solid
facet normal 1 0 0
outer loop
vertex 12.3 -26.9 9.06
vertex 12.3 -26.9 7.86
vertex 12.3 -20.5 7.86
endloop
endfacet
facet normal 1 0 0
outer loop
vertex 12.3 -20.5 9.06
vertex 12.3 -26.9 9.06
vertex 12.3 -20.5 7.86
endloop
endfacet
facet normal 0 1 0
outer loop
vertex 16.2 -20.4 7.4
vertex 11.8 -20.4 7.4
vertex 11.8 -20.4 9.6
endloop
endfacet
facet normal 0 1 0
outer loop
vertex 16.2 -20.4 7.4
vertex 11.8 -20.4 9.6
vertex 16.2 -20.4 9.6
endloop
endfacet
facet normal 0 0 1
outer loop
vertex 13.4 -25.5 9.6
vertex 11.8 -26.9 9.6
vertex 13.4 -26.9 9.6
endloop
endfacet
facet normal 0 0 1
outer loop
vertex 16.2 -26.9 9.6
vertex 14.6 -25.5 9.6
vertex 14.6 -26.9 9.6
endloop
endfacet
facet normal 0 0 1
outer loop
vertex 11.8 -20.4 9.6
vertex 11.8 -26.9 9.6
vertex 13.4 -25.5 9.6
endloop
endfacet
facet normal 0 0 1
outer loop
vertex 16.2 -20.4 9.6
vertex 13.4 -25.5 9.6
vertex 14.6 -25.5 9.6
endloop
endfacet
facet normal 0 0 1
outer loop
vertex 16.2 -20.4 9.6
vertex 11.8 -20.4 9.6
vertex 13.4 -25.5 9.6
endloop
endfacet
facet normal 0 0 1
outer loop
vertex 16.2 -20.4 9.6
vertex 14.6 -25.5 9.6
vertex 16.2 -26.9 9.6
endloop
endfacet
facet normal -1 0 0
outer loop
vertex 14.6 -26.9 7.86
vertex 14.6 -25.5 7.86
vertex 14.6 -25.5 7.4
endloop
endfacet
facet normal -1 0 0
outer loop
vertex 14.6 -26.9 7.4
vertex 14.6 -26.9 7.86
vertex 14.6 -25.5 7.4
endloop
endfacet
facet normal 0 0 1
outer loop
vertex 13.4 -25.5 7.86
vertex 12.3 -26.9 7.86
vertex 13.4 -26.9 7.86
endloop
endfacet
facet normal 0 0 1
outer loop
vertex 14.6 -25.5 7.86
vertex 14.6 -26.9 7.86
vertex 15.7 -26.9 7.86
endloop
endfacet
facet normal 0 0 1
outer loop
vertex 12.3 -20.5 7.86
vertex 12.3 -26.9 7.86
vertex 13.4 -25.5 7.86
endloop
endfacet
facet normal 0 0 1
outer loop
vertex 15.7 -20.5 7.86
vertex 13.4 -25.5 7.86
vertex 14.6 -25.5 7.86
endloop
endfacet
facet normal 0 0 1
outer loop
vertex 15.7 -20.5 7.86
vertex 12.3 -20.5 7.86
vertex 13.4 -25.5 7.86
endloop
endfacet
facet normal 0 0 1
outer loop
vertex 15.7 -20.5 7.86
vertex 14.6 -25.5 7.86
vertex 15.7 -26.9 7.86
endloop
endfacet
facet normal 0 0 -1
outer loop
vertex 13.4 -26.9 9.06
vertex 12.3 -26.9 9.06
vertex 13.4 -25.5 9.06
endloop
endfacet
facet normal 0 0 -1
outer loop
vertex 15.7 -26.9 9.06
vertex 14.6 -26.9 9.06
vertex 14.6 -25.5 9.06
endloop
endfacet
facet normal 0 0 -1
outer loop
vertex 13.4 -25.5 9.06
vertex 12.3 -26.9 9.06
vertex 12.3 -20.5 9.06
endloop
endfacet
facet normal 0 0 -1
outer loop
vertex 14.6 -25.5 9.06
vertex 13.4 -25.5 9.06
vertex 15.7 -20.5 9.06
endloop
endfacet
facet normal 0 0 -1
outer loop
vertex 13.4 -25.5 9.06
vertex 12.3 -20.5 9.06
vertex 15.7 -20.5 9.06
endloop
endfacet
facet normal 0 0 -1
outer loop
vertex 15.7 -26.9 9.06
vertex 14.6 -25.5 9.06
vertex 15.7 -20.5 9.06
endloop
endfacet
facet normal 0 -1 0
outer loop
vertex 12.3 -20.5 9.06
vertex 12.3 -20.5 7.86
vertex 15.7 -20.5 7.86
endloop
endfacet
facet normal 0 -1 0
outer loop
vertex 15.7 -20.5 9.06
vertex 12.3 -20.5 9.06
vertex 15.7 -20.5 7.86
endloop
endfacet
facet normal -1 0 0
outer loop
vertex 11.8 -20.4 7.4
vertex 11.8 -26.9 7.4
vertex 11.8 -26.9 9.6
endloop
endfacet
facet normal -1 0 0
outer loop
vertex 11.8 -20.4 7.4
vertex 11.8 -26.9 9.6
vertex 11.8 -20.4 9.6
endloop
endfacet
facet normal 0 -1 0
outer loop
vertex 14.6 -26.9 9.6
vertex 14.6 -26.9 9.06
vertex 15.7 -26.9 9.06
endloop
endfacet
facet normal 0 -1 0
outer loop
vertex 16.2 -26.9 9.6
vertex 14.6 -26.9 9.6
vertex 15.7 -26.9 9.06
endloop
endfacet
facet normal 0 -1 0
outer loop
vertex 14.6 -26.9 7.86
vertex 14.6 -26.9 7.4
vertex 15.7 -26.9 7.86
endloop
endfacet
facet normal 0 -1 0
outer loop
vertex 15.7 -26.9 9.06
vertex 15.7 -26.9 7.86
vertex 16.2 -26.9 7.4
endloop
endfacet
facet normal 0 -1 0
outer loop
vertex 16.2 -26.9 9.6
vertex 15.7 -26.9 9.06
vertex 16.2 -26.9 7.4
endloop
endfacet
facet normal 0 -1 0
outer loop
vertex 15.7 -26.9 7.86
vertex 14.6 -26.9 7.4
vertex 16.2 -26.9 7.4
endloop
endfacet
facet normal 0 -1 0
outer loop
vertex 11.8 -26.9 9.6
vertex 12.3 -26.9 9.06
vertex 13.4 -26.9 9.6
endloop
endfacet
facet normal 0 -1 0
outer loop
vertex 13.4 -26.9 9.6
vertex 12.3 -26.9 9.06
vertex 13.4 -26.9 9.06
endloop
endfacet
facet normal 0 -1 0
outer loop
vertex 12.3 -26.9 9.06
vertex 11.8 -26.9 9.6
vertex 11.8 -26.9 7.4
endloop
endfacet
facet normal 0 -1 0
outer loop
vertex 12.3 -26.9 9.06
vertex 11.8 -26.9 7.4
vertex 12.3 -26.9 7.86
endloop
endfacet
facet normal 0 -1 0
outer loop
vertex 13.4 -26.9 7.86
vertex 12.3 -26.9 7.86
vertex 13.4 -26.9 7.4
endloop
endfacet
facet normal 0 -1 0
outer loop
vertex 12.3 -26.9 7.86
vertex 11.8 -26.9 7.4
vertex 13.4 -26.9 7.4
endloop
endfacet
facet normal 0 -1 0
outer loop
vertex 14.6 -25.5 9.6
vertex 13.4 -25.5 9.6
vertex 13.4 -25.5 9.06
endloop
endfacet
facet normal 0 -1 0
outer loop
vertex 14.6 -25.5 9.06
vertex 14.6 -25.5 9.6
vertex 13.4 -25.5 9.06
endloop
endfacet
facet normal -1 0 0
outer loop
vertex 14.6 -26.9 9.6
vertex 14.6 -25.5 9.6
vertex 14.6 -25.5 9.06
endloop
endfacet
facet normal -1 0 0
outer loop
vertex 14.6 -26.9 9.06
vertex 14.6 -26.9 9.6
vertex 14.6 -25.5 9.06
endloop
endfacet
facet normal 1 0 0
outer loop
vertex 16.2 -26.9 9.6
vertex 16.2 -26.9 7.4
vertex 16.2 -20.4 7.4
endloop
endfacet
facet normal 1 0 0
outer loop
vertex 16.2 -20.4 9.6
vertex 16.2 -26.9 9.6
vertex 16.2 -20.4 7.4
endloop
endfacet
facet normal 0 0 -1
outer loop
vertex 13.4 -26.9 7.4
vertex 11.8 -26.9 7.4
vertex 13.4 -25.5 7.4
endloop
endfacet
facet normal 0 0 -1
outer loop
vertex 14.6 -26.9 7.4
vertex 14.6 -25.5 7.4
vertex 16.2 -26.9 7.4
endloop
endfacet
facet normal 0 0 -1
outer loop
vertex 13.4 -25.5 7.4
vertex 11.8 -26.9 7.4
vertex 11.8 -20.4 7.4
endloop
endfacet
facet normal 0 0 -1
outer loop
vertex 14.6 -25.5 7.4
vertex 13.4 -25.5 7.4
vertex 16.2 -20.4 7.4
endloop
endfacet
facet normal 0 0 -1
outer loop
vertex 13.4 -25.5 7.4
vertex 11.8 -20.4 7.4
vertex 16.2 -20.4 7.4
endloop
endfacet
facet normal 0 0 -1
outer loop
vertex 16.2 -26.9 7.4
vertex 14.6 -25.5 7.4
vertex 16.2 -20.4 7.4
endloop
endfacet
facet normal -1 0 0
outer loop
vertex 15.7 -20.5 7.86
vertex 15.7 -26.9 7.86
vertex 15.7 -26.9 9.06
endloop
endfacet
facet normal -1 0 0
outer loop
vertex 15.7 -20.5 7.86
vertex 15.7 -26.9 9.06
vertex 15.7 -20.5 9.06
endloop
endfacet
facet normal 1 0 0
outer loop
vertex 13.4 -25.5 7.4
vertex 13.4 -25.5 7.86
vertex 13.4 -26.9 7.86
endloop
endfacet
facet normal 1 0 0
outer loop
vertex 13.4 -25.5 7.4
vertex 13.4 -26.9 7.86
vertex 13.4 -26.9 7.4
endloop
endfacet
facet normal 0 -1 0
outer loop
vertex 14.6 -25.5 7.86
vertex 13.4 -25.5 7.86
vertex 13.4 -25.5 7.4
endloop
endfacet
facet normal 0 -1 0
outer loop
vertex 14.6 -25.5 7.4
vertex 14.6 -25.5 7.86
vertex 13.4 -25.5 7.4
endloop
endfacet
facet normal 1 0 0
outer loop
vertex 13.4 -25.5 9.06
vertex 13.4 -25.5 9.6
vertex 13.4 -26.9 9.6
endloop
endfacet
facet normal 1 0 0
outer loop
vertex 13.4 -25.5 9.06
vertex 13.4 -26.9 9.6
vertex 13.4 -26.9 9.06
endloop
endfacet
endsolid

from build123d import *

# Parameters (mm, degrees)
BOX310_W     = 3.4
BOX310_H     = 6.5
BOX310_DEPTH = 1.2
BOX309_W     = 3.4
BOX309_H     = 6.5
BOX309_DEPTH = 1.2
BOX308_W     = 4.4
BOX308_H     = 6.5
BOX308_DEPTH = 2.2


with BuildPart() as cubo295:
    # Box310 → Box310 (new body)
    with BuildSketch(Plane(origin=(15.8, -32, 13), x_dir=(0, 0, -1), z_dir=(1, 0, 0))):
        with Locations((1.7, 3.25)):
            Rectangle(BOX310_W, BOX310_H)
    extrude(amount=BOX310_DEPTH)


with BuildPart() as cubo294:
    # Box309 → Box309 (new body)
    with BuildSketch(Plane(origin=(14.7, -27, 10.26), x_dir=(1, 0, 0), z_dir=(0, 0, 1))):
        with Locations((1.7, 3.25)):
            Rectangle(BOX309_W, BOX309_H)
    extrude(amount=BOX309_DEPTH)


with BuildPart() as conectorunionpines001:
    # Box308 → Box308 (new body)
    with BuildSketch(Plane(origin=(14.2, -26.9, 9.8), x_dir=(1, 0, 0), z_dir=(0, 0, 1))):
        with Locations((2.2, 3.25)):
            Rectangle(BOX308_W, BOX308_H)
    extrude(amount=BOX308_DEPTH)

    # Cut350: cut Cubo294
    add(cubo294.part, mode=Mode.SUBTRACT)

    # Cut351: cut Cubo295
    add(cubo295.part, mode=Mode.SUBTRACT)


with BuildPart() as conectorunionpines001_1:
    # Cut351 placement: moved
    add(conectorunionpines001.part.moved(Location((-2.4, 0, -2.4))))


solid = conectorunionpines001_1.part
